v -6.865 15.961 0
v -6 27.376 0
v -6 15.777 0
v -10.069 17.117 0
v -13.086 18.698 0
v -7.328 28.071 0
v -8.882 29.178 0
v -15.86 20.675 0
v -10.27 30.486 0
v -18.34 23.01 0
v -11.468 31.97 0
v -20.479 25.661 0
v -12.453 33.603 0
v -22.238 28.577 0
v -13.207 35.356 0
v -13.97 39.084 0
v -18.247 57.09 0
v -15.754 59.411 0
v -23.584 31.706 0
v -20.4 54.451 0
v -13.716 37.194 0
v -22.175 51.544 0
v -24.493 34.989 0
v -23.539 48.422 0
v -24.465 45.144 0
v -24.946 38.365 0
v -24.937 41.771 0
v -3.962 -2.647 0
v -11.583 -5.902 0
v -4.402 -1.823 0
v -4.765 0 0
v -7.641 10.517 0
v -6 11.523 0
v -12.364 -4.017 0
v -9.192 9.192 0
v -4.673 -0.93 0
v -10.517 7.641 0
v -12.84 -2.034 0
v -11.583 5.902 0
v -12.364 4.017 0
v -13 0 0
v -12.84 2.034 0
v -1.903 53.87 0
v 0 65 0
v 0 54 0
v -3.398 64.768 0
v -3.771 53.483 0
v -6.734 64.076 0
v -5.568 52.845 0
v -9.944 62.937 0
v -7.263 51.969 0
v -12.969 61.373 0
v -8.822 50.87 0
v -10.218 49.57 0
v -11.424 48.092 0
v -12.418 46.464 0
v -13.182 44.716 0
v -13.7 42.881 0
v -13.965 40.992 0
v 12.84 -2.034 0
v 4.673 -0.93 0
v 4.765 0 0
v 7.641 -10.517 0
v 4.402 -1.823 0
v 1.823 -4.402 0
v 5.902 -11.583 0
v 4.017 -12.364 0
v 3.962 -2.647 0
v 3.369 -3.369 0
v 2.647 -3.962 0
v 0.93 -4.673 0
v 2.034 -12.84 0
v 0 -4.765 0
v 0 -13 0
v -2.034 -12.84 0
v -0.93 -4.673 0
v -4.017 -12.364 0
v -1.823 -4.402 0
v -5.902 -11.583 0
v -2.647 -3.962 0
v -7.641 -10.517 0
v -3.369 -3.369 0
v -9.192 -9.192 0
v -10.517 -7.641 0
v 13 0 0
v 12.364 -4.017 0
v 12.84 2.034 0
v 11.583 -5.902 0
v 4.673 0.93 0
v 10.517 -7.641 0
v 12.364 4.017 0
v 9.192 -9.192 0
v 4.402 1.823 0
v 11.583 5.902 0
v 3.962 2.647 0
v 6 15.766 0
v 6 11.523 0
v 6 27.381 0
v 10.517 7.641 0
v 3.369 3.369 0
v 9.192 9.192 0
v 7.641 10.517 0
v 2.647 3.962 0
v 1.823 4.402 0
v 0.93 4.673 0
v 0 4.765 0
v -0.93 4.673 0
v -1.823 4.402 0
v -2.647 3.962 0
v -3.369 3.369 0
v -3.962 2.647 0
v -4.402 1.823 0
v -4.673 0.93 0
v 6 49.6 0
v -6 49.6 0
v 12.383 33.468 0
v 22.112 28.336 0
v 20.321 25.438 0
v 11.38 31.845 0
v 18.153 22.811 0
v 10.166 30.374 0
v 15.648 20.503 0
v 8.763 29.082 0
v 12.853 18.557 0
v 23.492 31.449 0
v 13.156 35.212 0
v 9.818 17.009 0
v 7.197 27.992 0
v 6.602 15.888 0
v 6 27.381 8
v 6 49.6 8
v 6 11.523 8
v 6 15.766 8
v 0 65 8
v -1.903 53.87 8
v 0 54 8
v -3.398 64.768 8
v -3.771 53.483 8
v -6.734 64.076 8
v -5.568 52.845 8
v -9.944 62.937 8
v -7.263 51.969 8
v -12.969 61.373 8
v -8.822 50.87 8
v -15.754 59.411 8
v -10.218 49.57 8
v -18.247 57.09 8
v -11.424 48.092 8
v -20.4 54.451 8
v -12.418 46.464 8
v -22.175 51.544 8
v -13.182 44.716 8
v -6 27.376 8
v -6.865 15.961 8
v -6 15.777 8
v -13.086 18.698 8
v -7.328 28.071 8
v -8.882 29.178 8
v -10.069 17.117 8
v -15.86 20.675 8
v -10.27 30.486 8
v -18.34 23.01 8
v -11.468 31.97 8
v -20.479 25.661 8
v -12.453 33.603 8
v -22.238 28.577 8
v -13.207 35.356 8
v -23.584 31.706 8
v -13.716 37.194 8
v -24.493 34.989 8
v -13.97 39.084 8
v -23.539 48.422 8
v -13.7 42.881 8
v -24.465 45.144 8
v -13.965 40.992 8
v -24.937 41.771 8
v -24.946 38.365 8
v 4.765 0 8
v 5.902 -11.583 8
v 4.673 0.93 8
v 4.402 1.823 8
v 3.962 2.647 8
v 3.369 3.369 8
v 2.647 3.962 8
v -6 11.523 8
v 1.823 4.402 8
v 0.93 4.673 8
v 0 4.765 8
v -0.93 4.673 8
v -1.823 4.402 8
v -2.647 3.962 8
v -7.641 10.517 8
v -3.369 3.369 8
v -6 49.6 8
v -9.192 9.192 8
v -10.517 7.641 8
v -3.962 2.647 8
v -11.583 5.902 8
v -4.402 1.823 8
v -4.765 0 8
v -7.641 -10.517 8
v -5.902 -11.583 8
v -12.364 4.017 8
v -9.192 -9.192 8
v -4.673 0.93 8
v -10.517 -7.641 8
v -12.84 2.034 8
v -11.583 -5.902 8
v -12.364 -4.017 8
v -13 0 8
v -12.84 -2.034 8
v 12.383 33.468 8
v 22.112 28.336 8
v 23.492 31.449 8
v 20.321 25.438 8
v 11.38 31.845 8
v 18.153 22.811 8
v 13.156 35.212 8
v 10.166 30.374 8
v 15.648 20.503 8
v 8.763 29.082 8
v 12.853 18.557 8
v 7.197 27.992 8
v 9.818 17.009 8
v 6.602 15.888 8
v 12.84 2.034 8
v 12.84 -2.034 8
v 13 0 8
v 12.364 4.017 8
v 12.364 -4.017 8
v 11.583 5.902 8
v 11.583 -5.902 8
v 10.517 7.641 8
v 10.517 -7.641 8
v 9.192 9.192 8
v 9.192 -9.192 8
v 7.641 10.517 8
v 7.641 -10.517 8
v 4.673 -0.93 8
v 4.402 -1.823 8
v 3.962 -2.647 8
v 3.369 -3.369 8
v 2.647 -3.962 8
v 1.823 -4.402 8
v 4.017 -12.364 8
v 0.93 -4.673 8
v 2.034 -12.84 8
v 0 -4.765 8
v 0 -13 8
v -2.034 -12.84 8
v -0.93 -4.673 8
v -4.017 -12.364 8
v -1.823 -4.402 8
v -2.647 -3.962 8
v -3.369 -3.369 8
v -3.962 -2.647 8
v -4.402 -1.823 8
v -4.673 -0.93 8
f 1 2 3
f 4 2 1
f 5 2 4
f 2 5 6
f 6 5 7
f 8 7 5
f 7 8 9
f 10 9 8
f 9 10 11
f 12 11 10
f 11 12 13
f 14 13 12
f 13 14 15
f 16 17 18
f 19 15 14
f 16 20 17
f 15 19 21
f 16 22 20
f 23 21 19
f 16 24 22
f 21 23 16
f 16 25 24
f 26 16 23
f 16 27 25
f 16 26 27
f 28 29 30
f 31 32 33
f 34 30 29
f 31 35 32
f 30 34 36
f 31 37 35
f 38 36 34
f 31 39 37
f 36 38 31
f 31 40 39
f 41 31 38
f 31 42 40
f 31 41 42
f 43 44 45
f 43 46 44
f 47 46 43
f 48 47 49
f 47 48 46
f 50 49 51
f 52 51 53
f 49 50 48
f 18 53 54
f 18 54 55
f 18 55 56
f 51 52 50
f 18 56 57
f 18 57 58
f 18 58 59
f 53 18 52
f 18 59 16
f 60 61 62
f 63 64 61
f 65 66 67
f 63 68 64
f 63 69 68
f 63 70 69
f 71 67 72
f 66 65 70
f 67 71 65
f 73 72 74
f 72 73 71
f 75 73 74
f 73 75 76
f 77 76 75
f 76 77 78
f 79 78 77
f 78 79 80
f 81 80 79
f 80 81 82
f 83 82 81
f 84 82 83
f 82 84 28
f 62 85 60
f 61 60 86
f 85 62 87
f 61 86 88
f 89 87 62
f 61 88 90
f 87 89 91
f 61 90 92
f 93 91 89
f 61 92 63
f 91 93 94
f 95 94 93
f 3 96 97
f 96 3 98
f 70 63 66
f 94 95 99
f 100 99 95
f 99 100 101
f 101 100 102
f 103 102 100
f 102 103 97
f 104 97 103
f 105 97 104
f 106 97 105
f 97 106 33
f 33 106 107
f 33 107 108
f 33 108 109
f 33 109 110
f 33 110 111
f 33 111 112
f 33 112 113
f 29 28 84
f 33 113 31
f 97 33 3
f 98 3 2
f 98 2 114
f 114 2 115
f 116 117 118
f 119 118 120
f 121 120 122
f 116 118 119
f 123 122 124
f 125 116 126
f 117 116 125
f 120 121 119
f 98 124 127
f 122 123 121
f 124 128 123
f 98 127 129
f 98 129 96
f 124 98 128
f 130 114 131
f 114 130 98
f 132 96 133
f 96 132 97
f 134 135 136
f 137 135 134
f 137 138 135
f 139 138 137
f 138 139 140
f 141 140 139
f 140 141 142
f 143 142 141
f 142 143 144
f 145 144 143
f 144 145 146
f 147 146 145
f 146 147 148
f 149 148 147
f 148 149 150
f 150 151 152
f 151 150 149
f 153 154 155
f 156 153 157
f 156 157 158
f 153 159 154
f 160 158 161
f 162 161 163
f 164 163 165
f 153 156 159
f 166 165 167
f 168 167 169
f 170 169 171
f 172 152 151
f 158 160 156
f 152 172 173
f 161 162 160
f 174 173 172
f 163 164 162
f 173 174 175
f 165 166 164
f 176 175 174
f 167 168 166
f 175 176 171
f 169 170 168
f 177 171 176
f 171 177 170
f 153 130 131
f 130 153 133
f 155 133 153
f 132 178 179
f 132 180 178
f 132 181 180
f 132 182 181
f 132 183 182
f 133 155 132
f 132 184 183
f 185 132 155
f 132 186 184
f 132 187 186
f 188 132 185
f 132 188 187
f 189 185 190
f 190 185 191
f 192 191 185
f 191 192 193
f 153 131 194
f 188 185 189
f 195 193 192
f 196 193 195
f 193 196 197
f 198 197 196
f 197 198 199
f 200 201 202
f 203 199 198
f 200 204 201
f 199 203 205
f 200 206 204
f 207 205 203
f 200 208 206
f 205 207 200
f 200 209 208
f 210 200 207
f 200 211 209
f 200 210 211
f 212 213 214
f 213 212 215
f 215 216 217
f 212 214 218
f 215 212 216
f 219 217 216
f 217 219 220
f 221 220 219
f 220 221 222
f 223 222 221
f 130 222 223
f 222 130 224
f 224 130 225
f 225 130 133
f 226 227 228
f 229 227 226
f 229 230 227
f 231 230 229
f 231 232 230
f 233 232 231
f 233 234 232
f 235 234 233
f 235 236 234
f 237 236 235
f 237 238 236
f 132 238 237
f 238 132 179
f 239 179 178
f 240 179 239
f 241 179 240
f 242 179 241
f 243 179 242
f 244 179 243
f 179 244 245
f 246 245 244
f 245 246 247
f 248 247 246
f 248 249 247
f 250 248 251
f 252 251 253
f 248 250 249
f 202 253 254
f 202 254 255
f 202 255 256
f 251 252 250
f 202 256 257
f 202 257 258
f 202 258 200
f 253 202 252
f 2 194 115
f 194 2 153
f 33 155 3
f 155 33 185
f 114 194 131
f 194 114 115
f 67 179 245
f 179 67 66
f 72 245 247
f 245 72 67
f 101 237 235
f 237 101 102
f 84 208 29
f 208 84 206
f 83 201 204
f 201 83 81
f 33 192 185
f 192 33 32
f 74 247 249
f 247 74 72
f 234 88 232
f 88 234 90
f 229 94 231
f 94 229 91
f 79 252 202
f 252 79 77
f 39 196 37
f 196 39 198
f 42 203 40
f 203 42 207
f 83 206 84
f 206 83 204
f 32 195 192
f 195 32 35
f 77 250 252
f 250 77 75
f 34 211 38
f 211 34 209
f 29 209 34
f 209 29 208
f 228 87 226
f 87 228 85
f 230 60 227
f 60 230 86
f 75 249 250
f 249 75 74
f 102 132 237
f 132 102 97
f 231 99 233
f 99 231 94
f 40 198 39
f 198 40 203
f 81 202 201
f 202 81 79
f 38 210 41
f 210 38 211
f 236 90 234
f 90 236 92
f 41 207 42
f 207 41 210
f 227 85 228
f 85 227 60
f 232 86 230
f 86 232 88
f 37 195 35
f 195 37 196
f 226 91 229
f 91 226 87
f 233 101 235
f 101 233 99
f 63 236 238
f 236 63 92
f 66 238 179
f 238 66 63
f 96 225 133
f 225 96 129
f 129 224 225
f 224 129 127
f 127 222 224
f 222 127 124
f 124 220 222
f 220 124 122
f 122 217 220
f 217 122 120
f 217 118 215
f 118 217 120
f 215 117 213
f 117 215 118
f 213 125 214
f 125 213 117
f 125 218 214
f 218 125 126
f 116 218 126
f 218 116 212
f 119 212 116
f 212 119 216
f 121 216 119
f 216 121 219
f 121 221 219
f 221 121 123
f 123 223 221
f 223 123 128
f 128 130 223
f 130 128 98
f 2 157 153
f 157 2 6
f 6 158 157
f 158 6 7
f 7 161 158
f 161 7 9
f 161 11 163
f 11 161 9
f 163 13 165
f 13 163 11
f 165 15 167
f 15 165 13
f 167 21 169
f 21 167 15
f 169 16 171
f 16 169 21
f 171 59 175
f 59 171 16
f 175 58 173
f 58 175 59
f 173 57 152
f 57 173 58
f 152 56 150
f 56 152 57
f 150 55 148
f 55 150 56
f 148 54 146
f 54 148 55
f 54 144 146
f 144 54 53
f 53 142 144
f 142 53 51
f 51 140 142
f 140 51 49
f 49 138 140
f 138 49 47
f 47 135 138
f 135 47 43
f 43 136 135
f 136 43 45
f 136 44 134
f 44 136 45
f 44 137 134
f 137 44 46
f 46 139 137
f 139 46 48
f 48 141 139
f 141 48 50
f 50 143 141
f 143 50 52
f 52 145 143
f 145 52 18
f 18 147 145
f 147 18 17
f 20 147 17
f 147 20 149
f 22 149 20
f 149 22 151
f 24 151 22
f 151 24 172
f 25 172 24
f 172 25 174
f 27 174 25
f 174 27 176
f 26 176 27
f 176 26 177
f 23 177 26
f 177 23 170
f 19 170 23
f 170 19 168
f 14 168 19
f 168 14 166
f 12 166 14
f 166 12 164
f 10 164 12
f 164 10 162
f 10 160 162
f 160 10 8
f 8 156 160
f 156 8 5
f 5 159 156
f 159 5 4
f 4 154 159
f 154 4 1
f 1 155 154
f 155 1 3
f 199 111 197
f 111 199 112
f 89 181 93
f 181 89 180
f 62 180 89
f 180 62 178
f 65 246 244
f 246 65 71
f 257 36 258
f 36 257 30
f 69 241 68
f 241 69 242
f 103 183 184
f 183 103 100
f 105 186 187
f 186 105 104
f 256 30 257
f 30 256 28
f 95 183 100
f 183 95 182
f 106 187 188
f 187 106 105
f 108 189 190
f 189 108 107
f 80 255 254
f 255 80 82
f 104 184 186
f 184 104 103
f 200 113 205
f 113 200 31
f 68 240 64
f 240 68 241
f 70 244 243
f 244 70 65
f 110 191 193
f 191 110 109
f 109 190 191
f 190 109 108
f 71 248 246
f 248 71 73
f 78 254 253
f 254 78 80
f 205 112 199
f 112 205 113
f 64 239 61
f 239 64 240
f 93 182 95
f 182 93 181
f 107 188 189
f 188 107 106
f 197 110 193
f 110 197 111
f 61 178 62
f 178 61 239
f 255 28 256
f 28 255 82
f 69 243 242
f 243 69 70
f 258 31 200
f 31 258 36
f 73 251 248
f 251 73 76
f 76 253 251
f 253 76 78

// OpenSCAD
$fn = 32;

// ----------------------------------------------------------------------
// Hook: 80 mm shank into a 14 mm curl, 8 mm thick
// ----------------------------------------------------------------------

// --- parameters (mm) ---
shank_len = 80;           // shank length from the boss centre
shank_w = 12;             // shank width
boss_d = 26;              // boss diameter
bore_d = 9.53;            // boss bore
curl_in = 14;             // curl inner radius
curl_out = 25;            // curl outer radius
curl_sweep = 250;         // curl sweep angle
hook_t = 8;               // hook thickness

shank_profile = [[-6, 49.6], [6, 49.6], [6, 11], [-6, 11]];
boss_profile = [[13, 0], [12.84, 2.034], [12.364, 4.017], [11.583, 5.902], [10.517, 7.641], [9.192, 9.192], [7.641, 10.517], [5.902, 11.583], [4.017, 12.364], [2.034, 12.84], [0, 13], [-2.034, 12.84], [-4.017, 12.364], [-5.902, 11.583], [-7.641, 10.517], [-9.192, 9.192], [-10.517, 7.641], [-11.583, 5.902], [-12.364, 4.017], [-12.84, 2.034], [-13, 0], [-12.84, -2.034], [-12.364, -4.017], [-11.583, -5.902], [-10.517, -7.641], [-9.192, -9.192], [-7.641, -10.517], [-5.902, -11.583], [-4.017, -12.364], [-2.034, -12.84], [0, -13], [2.034, -12.84], [4.017, -12.364], [5.902, -11.583], [7.641, -10.517], [9.192, -9.192], [10.517, -7.641], [11.583, -5.902], [12.364, -4.017], [12.84, -2.034]];
curl_profile = [[0, 65], [-3.398, 64.768], [-6.734, 64.076], [-9.944, 62.937], [-12.969, 61.373], [-15.754, 59.411], [-18.247, 57.09], [-20.4, 54.451], [-22.175, 51.544], [-23.539, 48.422], [-24.465, 45.144], [-24.937, 41.771], [-24.946, 38.365], [-24.493, 34.989], [-23.584, 31.706], [-22.238, 28.577], [-20.479, 25.661], [-18.34, 23.01], [-15.86, 20.675], [-13.086, 18.698], [-10.069, 17.117], [-6.865, 15.961], [-3.533, 15.251], [-0.136, 15], [3.263, 15.214], [6.602, 15.888], [9.818, 17.009], [12.853, 18.557], [15.648, 20.503], [18.153, 22.811], [20.321, 25.438], [22.112, 28.336], [23.492, 31.449], [13.156, 35.212], [12.383, 33.468], [11.38, 31.845], [10.166, 30.374], [8.763, 29.082], [7.197, 27.992], [5.498, 27.125], [3.697, 26.497], [1.827, 26.12], [-0.076, 26], [-1.979, 26.141], [-3.844, 26.538], [-5.638, 27.186], [-7.328, 28.071], [-8.882, 29.178], [-10.27, 30.486], [-11.468, 31.97], [-12.453, 33.603], [-13.207, 35.356], [-13.716, 37.194], [-13.97, 39.084], [-13.965, 40.992], [-13.7, 42.881], [-13.182, 44.716], [-12.418, 46.464], [-11.424, 48.092], [-10.218, 49.57], [-8.822, 50.87], [-7.263, 51.969], [-5.568, 52.845], [-3.771, 53.483], [-1.903, 53.87], [0, 54]];

difference() {
  union() {
    /* three overlapping outlines: shank, boss and the smooth curl */
    linear_extrude(height = hook_t) polygon(shank_profile);
    linear_extrude(height = hook_t) polygon(boss_profile);
    linear_extrude(height = hook_t) polygon(curl_profile);
  }
  translate([0, 0, -2.5]) cylinder(h = hook_t + 5, d = bore_d);
}
